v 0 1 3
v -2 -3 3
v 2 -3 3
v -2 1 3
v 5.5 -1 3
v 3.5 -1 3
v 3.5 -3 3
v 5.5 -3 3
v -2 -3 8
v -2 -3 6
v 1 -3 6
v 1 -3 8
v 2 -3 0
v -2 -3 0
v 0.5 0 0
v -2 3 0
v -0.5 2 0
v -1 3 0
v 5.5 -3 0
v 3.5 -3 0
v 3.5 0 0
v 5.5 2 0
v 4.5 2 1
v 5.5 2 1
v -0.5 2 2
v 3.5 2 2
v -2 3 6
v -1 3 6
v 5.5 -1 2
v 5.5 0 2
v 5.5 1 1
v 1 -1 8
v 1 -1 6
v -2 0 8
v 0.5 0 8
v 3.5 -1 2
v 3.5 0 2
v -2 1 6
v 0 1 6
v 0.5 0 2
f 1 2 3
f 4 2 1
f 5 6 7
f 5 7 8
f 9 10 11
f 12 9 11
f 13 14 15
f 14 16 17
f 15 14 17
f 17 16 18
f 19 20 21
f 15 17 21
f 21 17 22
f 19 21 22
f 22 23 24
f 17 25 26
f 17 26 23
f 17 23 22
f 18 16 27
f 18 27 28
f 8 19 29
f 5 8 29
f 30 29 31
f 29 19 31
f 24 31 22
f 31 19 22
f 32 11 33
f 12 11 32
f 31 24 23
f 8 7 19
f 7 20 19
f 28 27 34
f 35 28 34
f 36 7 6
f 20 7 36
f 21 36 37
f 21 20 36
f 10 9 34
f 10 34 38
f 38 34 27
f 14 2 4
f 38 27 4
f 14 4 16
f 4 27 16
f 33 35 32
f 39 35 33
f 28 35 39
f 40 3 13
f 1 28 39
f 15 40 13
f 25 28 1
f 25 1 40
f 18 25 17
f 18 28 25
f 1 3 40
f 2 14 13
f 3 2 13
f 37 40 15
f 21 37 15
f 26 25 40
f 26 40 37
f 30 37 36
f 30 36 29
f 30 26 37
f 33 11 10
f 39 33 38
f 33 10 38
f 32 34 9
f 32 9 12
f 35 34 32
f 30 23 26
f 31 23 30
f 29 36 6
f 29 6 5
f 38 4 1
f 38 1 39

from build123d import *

# Parameters (mm, degrees)
SKETCH1_W           = 4
SKETCH1_H           = 6
BOSS_EXTRUDE1_DEPTH = 8
SKETCH6_W           = 8
SKETCH6_H           = 6.708203932
CUT_EXTRUDE4_DEPTH  = 8
SKETCH7_W           = 3
SKETCH7_H           = 3
CUT_EXTRUDE5_DEPTH  = 10.433981132
SKETCH8_W           = 1
SKETCH8_H           = 2
CUT_EXTRUDE6_DEPTH  = 11.198039027
SKETCH9_W           = 3
SKETCH9_H           = 1
CUT_EXTRUDE7_DEPTH  = 10.433981132
CUT_EXTRUDE8_DEPTH  = 10.433981132
SKETCH12_W          = 2
SKETCH12_H          = 2
BOSS_EXTRUDE2_DEPTH = 3
SKETCH13_W          = 2
SKETCH13_H          = 2
BOSS_EXTRUDE3_DEPTH = 1.5
SKETCH14_W          = 2
SKETCH14_H          = 2
BOSS_EXTRUDE4_DEPTH = 3
SKETCH15_W          = 2
SKETCH15_H          = 2
BOSS_EXTRUDE5_DEPTH = 1
CUT_EXTRUDE9_DEPTH  = 1
CUT_EXTRUDE10_DEPTH = 1


with BuildPart() as part:
    # Sketch1 → Boss-Extrude1 (new body)
    with BuildSketch(Plane.XY):
        Rectangle(SKETCH1_W, SKETCH1_H)
    extrude(amount=BOSS_EXTRUDE1_DEPTH)

    # Sketch6 → Cut-Extrude4 (cut)
    with BuildSketch(Plane(origin=(0.4, 0.2, 0), x_dir=(0, 0, -1), z_dir=(0.894427190999916, 0.4472135954999579, 0))):
        with Locations((-4, -0.223606798)):
            Rectangle(SKETCH6_W, SKETCH6_H)
    extrude(amount=CUT_EXTRUDE4_DEPTH, mode=Mode.SUBTRACT)

    # Sketch7 → Cut-Extrude5 (cut, through all)
    with BuildSketch(Plane.ZY.offset(2)):
        with Locations((4.5, -1.5)):
            Rectangle(SKETCH7_W, SKETCH7_H)
    extrude(amount=-CUT_EXTRUDE5_DEPTH, mode=Mode.SUBTRACT)

    # Sketch8 → Cut-Extrude6 (cut, through all)
    with BuildSketch(Plane.XZ.offset(3)):
        with Locations((1.5, 7)):
            Rectangle(SKETCH8_W, SKETCH8_H)
    extrude(amount=-CUT_EXTRUDE6_DEPTH, mode=Mode.SUBTRACT)

    # Sketch9 → Cut-Extrude7 (cut, through all)
    with BuildSketch(Plane.ZY.offset(2)):
        with Locations((4.5, 0.5)):
            Rectangle(SKETCH9_W, SKETCH9_H)
    extrude(amount=-CUT_EXTRUDE7_DEPTH, mode=Mode.SUBTRACT)

    # Sketch10 → Cut-Extrude8 (cut, through all)
    with BuildSketch(Plane.ZY.offset(2)):
        Polygon((6, 3), (8, 0), (8, 3), align=None)
    extrude(amount=-CUT_EXTRUDE8_DEPTH, mode=Mode.SUBTRACT)

    # Sketch12 → Boss-Extrude2 (add, symmetric)
    with BuildSketch(Plane(origin=(1, 0, 0), x_dir=(0, 0, -1), z_dir=(1, 0, 0))):
        with Locations((-1, 1)):
            Rectangle(SKETCH12_W, SKETCH12_H)
    extrude(amount=BOSS_EXTRUDE2_DEPTH, both=True)

    # Sketch13 → Boss-Extrude3 (add)
    with BuildSketch(Plane(origin=(4, 0, 0), x_dir=(0, 0, -1), z_dir=(1, 0, 0))):
        with Locations((-1, 1)):
            Rectangle(SKETCH13_W, SKETCH13_H)
    extrude(amount=BOSS_EXTRUDE3_DEPTH)

    # Sketch14 → Boss-Extrude4 (add)
    with BuildSketch(Plane.XZ):
        with Locations((4.5, 1)):
            Rectangle(SKETCH14_W, SKETCH14_H)
    extrude(amount=BOSS_EXTRUDE4_DEPTH)

    # Sketch15 → Boss-Extrude5 (add)
    with BuildSketch(Plane.XY.offset(2)):
        with Locations((4.5, -2)):
            Rectangle(SKETCH15_W, SKETCH15_H)
    extrude(amount=BOSS_EXTRUDE5_DEPTH)

    # Sketch18 → Cut-Extrude9 (cut)
    with BuildSketch(Plane.XY.offset(2)):
        Polygon((5.5, 1), (4.5, 2), (5.5, 2), align=None)
    extrude(amount=-CUT_EXTRUDE9_DEPTH, mode=Mode.SUBTRACT)

    # 3DSketch1 → Cut-Extrude10 (cut, along a direction that is not the sketch's normal)
    with BuildSketch(Plane(origin=(5.5, 0, 2), x_dir=(-0.7071067811865472, 0.707106781186548, 0), z_dir=(-0.577350269189626, -0.5773502691896253, -0.5773502691896261))):
        Polygon((0, 0), (0.707106781, 1.224744871), (2.121320344, 1.224744871), (2.828427125, 0), align=None)
    extrude(amount=-CUT_EXTRUDE10_DEPTH, dir=(-0.7071067811865478, -0.7071067811865472, 0), mode=Mode.SUBTRACT)


solid = part.part
